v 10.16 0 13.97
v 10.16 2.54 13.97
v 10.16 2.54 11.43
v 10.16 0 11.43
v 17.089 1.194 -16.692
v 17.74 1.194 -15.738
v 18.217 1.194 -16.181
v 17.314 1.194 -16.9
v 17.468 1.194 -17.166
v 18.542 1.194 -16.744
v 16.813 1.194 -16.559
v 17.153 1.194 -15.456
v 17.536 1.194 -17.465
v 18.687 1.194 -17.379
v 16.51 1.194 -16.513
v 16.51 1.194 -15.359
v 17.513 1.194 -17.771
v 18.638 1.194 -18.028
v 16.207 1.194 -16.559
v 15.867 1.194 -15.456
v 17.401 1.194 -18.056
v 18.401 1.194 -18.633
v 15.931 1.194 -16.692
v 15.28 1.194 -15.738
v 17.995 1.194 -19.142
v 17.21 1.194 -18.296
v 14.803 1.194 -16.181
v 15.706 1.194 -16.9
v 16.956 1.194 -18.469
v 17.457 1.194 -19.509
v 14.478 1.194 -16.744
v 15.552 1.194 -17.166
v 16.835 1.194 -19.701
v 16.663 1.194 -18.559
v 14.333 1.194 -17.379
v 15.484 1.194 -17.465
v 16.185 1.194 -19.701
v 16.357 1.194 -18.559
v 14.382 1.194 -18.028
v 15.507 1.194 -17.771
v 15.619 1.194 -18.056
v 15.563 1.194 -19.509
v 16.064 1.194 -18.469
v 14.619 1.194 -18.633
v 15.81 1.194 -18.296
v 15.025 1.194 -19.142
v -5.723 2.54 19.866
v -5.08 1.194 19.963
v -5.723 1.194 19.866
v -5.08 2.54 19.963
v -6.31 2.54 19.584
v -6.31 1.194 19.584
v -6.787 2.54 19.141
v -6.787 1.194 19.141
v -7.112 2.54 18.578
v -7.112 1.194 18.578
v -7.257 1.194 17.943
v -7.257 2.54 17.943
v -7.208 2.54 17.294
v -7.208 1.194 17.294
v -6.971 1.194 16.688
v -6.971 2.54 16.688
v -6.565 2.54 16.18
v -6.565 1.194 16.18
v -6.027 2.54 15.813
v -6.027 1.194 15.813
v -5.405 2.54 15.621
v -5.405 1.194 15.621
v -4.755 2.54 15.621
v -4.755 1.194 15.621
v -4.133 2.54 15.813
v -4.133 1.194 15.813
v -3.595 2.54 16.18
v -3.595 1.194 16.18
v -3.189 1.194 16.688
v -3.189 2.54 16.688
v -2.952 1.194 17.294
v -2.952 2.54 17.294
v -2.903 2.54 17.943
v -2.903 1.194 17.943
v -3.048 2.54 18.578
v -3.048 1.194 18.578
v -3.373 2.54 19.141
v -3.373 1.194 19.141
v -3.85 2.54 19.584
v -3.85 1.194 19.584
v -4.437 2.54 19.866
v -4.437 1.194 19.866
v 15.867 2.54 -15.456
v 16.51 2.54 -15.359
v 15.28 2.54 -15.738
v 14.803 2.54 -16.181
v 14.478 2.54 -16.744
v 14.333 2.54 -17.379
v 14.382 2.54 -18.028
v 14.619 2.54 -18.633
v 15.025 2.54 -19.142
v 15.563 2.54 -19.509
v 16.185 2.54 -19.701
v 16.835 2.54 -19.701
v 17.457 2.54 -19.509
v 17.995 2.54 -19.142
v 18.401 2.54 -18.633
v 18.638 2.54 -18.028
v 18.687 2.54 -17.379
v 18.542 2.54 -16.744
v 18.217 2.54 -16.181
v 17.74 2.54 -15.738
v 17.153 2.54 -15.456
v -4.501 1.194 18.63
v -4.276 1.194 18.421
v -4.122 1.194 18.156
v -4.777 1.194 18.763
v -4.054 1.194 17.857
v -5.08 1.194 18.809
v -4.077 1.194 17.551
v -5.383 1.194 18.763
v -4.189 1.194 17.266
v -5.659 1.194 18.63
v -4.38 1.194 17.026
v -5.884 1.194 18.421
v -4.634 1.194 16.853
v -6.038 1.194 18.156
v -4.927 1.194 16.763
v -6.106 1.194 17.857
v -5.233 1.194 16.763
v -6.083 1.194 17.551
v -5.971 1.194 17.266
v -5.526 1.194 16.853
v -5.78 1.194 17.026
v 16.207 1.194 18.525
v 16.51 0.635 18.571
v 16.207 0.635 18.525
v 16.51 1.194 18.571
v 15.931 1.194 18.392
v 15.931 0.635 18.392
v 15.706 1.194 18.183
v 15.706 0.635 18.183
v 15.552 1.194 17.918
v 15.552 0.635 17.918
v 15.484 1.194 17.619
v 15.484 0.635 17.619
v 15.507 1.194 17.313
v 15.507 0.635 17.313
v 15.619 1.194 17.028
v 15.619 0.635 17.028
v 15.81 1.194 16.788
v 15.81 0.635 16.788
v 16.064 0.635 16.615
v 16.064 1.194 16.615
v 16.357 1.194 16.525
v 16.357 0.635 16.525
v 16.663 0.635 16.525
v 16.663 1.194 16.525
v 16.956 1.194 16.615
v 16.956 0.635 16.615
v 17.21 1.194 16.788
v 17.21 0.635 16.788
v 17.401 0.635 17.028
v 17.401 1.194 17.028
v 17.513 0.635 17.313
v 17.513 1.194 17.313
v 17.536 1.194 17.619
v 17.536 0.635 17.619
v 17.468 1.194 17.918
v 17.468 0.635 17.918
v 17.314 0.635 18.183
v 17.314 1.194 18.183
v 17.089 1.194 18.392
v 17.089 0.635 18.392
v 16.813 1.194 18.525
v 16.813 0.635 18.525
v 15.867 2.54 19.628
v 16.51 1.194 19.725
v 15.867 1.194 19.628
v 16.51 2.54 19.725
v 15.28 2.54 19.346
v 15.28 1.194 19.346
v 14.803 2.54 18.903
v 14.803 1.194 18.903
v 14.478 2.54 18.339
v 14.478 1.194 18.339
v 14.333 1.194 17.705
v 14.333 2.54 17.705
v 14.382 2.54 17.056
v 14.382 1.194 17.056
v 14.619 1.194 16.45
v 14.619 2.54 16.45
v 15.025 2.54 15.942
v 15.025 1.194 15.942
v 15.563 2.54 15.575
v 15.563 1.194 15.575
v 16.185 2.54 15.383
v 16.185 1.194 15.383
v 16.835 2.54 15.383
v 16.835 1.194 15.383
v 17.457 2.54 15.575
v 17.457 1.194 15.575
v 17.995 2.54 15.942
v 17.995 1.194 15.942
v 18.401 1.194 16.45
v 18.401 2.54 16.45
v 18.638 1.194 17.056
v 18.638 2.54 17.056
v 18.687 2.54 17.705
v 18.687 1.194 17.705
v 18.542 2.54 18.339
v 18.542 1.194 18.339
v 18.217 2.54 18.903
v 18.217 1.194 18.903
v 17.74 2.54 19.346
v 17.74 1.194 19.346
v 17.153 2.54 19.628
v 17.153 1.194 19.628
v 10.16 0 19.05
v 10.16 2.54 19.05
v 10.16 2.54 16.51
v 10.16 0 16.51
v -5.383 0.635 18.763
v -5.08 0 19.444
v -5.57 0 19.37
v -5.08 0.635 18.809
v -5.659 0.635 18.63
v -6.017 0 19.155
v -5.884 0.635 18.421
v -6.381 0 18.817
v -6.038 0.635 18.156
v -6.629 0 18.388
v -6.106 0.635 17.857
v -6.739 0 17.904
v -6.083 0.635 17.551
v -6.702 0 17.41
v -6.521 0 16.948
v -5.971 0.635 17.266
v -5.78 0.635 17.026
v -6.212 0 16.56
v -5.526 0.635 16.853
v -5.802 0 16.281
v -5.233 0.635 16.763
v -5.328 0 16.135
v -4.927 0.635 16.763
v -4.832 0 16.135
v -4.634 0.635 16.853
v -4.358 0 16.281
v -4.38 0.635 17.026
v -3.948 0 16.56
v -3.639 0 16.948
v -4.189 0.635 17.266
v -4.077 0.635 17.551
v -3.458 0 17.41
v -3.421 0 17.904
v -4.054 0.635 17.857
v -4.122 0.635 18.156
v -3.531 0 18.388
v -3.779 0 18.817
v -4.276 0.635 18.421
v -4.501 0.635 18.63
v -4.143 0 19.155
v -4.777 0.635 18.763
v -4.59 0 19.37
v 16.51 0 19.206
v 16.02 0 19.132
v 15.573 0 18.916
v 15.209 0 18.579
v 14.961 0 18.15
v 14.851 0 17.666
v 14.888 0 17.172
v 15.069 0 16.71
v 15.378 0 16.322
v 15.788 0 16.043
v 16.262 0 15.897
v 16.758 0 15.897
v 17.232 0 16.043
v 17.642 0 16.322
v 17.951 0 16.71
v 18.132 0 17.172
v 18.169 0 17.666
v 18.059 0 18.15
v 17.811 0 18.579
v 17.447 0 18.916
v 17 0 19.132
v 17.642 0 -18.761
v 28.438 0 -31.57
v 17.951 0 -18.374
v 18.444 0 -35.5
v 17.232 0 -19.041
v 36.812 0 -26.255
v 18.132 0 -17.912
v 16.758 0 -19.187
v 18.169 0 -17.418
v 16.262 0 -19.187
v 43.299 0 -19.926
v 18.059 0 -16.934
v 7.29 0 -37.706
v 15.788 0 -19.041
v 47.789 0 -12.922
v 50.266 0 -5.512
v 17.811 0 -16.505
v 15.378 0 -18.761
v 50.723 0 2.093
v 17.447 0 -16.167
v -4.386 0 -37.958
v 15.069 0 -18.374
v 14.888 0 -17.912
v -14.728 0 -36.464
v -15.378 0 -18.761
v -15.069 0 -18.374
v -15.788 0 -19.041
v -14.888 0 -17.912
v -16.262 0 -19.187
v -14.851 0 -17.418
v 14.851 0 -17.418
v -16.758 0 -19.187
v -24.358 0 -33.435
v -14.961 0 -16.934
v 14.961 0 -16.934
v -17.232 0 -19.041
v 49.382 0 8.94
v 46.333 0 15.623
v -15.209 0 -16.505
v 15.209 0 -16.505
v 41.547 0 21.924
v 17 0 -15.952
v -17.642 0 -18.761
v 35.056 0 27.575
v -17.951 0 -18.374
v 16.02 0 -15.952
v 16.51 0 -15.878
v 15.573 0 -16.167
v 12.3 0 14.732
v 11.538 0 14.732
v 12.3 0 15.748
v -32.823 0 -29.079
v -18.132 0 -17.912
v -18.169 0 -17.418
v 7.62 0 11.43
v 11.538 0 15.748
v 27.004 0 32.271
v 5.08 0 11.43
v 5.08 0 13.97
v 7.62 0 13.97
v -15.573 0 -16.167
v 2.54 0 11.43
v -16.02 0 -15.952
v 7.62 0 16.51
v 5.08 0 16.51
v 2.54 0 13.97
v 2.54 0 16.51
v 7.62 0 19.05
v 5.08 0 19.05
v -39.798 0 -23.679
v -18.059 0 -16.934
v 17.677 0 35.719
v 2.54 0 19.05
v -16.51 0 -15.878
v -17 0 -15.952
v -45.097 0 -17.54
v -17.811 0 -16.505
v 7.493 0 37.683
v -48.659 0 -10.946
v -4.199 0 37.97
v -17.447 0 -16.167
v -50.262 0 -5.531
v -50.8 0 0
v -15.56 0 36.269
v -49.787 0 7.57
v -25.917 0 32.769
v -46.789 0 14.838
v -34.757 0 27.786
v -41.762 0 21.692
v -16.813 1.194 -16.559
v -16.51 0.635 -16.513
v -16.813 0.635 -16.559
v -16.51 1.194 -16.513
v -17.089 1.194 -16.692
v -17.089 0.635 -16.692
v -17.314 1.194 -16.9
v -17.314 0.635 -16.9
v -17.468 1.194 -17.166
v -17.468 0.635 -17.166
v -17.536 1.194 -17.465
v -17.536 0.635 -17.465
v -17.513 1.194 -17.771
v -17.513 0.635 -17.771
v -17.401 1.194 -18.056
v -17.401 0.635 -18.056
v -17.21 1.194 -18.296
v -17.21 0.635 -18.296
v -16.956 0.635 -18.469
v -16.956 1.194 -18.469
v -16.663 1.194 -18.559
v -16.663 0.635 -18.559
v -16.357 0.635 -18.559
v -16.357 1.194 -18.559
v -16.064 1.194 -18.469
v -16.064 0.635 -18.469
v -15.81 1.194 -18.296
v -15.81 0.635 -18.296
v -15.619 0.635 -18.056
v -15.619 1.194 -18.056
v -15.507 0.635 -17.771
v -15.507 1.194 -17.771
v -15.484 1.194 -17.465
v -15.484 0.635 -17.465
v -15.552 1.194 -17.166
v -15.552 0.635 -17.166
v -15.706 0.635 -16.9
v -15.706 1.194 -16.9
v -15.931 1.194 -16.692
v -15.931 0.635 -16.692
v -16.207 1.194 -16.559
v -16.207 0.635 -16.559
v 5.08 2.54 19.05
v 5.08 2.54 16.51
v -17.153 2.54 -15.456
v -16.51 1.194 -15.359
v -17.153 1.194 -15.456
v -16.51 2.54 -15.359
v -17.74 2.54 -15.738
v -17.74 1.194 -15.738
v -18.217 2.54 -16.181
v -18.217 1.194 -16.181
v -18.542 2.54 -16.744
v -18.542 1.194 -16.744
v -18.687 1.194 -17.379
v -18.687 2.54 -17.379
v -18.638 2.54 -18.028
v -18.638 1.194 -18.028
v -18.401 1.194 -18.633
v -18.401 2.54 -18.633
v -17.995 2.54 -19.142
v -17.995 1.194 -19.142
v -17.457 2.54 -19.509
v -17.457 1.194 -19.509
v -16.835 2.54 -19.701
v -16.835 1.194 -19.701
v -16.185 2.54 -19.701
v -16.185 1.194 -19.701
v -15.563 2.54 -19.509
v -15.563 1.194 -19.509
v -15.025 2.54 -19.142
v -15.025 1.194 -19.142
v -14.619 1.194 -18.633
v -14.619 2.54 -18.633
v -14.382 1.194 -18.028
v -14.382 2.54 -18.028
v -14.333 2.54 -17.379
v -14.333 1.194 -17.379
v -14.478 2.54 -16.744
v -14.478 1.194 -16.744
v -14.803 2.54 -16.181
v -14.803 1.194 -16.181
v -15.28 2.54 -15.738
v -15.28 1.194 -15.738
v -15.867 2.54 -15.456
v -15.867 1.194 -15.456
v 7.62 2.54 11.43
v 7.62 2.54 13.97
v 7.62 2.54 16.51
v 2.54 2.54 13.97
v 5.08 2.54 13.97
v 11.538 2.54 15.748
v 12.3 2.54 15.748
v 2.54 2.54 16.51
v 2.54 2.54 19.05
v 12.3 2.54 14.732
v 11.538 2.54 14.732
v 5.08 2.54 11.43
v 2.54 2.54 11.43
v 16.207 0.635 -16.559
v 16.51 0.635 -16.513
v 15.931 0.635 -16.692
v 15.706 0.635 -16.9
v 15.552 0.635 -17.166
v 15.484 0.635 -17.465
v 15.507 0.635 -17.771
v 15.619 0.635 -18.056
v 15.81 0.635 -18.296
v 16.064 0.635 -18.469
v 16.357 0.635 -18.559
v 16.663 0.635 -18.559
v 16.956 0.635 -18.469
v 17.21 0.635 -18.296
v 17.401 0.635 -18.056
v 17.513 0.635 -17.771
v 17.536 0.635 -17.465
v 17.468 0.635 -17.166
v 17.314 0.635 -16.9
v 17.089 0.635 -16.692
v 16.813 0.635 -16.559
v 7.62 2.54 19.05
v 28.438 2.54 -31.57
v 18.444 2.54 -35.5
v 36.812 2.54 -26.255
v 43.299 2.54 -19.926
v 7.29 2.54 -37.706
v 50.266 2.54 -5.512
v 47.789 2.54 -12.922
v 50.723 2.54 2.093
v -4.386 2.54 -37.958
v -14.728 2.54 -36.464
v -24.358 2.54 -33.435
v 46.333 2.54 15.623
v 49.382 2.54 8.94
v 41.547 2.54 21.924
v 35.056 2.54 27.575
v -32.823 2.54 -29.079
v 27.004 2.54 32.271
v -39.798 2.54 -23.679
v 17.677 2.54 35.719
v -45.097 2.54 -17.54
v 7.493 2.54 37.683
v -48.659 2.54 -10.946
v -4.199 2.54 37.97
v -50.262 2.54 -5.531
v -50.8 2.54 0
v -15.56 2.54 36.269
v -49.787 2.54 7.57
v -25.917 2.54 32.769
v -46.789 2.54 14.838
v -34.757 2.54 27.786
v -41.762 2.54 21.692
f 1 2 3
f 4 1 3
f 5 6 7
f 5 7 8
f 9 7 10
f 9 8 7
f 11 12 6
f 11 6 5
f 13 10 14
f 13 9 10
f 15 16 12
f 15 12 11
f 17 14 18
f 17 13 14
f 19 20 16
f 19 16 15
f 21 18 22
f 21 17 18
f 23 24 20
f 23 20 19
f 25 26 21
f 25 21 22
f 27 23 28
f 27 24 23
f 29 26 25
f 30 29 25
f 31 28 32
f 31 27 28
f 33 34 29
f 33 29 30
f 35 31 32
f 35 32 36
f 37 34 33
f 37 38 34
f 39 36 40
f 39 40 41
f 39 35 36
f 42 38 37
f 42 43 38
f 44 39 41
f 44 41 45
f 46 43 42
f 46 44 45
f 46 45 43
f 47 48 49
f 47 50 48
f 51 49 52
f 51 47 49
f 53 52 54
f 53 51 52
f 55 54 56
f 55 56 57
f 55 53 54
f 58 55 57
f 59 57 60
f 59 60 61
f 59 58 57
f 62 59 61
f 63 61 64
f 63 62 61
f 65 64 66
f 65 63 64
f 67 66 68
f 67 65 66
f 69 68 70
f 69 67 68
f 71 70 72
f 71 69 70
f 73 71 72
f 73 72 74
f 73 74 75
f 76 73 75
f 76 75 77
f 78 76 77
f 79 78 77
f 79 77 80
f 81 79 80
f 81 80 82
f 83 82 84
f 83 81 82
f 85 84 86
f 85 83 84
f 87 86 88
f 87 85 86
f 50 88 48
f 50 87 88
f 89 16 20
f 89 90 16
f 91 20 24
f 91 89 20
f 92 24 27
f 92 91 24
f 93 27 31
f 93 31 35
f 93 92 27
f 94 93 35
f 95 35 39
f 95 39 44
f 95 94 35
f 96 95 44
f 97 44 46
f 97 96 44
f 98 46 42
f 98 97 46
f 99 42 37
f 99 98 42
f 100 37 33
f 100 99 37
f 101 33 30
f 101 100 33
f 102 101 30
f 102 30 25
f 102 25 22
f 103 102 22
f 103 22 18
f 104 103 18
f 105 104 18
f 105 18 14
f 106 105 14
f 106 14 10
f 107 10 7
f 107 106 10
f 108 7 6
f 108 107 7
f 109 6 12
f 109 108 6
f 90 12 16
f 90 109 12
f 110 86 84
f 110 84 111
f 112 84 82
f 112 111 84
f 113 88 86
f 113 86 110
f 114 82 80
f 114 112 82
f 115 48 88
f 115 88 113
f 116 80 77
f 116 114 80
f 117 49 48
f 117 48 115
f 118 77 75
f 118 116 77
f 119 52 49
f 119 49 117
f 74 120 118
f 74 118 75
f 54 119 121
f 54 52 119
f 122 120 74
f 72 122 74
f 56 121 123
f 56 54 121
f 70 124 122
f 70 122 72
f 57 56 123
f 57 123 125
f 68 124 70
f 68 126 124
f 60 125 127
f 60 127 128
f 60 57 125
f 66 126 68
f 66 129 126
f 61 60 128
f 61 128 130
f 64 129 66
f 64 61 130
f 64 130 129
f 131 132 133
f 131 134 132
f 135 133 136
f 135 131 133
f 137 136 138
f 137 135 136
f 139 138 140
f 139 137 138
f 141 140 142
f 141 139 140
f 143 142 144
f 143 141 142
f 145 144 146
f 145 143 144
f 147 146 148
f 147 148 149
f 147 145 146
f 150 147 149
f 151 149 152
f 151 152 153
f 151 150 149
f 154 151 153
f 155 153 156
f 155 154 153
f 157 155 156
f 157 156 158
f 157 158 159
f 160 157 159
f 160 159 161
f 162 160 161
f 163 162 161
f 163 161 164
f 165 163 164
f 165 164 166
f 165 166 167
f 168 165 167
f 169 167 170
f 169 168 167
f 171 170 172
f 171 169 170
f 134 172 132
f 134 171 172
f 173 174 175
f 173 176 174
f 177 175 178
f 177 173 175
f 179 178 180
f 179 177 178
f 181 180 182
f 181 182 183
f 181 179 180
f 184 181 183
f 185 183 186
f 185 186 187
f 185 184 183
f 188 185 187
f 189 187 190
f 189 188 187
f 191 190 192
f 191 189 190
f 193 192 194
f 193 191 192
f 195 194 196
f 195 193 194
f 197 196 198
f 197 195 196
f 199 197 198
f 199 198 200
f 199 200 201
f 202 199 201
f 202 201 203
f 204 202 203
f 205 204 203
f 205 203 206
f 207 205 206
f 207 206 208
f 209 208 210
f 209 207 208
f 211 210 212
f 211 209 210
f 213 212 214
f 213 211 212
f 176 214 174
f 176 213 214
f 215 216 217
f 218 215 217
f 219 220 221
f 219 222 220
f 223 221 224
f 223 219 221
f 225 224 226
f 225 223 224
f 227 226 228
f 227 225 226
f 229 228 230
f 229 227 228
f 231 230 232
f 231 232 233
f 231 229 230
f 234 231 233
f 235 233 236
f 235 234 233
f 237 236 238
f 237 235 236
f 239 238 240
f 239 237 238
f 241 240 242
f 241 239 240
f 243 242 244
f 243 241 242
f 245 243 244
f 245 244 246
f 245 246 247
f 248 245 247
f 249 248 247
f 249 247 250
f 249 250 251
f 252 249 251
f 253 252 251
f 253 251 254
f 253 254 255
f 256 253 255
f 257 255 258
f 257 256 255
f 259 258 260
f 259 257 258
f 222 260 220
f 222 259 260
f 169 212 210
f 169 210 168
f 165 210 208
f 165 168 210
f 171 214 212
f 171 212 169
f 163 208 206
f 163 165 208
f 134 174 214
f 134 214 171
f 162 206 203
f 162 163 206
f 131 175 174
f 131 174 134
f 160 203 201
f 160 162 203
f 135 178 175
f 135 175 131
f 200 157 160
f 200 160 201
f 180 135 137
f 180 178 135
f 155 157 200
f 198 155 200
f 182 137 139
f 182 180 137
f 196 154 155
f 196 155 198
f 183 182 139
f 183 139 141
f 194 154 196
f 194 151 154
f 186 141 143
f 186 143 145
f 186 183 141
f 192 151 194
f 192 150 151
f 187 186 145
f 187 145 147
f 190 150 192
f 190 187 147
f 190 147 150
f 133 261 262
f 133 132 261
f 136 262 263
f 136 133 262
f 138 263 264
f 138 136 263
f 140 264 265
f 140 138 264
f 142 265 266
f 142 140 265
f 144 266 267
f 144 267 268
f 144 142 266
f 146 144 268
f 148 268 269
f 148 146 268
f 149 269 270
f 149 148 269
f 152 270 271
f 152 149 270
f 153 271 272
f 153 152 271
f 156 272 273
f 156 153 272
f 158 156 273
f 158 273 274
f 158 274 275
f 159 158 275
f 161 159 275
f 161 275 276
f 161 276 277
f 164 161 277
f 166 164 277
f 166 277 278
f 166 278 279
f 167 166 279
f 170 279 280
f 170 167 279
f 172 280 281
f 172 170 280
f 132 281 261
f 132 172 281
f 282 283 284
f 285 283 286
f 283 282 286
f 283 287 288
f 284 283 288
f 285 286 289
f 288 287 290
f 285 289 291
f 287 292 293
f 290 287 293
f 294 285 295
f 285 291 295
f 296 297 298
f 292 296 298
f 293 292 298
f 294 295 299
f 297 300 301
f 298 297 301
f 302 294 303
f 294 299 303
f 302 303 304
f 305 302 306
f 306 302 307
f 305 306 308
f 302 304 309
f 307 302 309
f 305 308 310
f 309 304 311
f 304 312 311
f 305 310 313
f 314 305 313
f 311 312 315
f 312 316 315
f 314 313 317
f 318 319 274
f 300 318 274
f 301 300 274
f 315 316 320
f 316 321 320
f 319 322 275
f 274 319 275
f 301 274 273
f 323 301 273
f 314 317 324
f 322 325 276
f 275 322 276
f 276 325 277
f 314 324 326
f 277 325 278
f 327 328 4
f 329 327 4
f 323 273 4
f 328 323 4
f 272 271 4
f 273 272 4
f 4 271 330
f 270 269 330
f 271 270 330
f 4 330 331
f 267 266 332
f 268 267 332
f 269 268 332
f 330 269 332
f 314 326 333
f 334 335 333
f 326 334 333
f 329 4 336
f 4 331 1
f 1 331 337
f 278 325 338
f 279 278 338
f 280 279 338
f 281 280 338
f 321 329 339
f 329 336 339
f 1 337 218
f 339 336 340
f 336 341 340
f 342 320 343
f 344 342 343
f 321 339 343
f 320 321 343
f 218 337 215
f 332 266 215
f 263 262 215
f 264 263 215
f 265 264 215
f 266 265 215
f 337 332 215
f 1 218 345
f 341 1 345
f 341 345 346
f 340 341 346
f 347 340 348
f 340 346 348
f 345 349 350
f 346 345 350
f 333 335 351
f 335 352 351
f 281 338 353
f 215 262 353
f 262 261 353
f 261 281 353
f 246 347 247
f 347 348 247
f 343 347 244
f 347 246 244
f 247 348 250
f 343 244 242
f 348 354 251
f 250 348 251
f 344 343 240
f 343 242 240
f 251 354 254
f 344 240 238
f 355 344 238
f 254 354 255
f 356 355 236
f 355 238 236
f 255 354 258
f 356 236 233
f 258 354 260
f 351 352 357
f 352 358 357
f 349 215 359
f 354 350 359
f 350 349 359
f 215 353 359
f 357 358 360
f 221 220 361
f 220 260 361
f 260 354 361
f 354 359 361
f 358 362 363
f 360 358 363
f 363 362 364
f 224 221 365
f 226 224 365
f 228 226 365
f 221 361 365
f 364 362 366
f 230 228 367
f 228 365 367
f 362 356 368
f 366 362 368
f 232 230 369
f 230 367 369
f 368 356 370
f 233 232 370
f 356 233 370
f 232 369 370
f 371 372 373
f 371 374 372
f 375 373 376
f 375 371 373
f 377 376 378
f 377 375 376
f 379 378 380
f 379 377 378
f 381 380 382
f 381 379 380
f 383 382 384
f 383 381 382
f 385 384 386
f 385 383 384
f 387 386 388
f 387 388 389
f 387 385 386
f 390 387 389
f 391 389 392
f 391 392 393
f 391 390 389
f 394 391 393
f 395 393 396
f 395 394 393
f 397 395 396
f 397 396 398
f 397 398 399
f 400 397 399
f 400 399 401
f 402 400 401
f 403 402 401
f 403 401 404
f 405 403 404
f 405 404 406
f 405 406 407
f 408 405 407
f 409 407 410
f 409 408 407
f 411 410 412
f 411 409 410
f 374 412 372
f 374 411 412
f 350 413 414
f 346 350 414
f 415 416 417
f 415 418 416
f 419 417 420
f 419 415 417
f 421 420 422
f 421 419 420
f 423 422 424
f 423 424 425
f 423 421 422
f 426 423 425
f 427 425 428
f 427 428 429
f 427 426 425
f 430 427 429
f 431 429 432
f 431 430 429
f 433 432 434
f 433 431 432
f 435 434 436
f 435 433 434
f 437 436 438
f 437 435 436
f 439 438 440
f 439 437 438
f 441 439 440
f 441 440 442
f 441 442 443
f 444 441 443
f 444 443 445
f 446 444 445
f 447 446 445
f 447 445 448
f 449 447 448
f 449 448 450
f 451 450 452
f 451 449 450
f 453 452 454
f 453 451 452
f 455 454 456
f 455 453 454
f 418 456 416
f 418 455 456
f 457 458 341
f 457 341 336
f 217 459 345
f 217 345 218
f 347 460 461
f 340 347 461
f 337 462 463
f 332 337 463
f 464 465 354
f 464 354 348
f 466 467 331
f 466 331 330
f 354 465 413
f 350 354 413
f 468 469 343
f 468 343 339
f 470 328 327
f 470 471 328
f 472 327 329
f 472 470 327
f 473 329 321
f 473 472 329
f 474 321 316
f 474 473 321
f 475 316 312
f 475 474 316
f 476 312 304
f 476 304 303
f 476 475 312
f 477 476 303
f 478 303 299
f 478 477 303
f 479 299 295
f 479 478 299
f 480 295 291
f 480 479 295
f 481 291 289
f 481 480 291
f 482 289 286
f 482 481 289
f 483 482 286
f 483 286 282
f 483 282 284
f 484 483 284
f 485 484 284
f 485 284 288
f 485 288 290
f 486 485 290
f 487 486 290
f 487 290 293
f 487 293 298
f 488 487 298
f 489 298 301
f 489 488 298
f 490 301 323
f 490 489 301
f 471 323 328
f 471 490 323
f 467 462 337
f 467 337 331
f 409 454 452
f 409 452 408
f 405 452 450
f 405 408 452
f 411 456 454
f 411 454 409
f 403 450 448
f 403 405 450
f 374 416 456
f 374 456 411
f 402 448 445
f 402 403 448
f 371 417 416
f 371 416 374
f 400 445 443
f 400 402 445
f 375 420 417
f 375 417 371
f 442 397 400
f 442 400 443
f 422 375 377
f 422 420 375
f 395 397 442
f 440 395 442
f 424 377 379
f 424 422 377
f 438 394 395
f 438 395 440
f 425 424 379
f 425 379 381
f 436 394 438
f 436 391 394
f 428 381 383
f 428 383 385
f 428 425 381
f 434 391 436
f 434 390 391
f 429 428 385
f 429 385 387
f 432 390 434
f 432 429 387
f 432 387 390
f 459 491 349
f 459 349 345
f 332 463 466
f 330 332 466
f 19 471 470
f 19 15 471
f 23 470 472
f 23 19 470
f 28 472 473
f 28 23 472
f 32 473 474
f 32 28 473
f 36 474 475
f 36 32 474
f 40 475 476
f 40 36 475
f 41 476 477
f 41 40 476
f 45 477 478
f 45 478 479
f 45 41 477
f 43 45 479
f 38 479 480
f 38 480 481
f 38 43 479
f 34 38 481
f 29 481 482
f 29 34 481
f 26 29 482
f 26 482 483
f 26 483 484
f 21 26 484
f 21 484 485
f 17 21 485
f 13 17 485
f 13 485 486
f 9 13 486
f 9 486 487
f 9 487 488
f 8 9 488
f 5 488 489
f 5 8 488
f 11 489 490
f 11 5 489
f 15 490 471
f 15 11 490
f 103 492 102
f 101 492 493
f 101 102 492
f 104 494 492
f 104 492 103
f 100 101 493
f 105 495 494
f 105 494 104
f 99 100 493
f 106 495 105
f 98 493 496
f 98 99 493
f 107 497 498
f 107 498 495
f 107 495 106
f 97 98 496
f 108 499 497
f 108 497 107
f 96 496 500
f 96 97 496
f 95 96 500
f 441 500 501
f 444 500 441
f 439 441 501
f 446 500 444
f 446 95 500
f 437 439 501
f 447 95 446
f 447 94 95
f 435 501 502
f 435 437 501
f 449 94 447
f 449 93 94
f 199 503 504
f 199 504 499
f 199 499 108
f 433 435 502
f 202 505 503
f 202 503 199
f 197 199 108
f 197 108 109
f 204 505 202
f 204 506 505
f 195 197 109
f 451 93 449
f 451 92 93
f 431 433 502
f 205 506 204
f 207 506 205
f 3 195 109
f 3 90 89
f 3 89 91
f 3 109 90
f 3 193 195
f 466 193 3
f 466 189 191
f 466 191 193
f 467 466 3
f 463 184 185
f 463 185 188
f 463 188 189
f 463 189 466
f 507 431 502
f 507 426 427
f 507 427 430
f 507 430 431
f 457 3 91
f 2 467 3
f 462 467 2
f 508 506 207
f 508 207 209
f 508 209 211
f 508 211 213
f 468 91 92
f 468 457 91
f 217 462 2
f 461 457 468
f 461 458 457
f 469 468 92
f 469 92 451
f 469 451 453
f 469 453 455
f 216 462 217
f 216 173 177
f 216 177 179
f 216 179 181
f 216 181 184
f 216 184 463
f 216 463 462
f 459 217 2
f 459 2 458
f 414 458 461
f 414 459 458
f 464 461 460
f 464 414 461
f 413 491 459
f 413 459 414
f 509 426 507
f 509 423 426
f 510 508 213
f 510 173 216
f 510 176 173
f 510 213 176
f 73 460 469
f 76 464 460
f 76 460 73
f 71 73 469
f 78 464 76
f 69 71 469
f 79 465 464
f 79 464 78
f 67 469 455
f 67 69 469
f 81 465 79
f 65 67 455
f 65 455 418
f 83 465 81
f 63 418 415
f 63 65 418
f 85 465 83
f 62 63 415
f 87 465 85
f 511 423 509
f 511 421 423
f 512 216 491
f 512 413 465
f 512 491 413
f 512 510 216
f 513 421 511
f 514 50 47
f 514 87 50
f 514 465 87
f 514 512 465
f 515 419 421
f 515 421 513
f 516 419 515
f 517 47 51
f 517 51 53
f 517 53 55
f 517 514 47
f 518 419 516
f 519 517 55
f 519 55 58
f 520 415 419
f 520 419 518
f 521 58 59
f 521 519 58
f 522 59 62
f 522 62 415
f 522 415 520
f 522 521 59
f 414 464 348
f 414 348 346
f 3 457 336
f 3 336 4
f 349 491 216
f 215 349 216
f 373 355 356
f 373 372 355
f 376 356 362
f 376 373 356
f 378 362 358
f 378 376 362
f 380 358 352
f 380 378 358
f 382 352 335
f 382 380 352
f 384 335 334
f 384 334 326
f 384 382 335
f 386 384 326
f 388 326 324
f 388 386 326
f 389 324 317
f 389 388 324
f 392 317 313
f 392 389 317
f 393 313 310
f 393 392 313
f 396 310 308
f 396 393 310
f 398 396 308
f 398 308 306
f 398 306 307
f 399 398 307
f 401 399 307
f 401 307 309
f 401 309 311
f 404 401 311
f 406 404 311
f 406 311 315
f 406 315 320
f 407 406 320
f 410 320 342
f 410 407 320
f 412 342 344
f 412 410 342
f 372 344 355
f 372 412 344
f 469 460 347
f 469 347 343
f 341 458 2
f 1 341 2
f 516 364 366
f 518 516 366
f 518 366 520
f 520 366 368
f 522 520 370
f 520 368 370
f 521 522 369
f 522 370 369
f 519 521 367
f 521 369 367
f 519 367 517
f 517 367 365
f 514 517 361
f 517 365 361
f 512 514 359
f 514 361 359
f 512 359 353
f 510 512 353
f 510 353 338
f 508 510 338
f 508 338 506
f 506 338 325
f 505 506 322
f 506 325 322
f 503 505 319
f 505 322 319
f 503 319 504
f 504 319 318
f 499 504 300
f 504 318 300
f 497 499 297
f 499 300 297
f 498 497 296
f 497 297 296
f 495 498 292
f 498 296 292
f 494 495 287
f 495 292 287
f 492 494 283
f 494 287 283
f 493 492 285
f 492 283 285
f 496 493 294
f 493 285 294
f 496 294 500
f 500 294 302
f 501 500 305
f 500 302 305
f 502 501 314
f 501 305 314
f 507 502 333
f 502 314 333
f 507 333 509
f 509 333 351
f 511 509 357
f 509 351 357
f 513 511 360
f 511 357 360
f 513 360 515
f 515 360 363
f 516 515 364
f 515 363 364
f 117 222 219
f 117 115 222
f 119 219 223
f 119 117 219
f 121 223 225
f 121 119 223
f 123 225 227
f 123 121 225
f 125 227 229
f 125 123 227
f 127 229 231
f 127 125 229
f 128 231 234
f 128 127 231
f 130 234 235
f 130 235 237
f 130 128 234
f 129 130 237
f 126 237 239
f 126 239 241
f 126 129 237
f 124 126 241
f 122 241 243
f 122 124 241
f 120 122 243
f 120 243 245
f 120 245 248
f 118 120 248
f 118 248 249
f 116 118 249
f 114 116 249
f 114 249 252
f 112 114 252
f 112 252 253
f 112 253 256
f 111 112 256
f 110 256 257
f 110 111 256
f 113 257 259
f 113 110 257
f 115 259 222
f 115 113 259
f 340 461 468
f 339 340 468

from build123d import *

# Parameters (mm, degrees)
SKETCH2_RX                                   = 50.8
SKETCH2_RY                                   = 38.1
TOP_DEPTH                                    = 2.54
SKETCH4_W                                    = 2.54
SKETCH4_H                                    = 2.54
SKETCH4_W_2                                  = 0.762
SKETCH4_H_2                                  = 1.016
BUTTONS_AND_LED_DEPTH                        = 2.54
CBORE_FOR_1_PAN_HEAD_MACHINE_SCREW1_AT_COUNT = 2
CBORE_FOR_1_PAN_HEAD_MACHINE_SCREW1_AT_PITCH = 21.591313149
CBORE_FOR_1_PAN_HEAD_MACHINE_SCREW1_2_COUNT  = 2
CBORE_FOR_1_PAN_HEAD_MACHINE_SCREW1_2_PITCH  = 41.397620143
CBORE_FOR_1_PAN_HEAD_MACHINE_SCREW1_3_COUNT  = 2
CBORE_FOR_1_PAN_HEAD_MACHINE_SCREW1_3_PITCH  = 37.125190283


with BuildPart() as part:
    # Sketch2 → top (new body)
    with BuildSketch(Plane(origin=(0, 0, 0), x_dir=(1, 0, 0), z_dir=(0, 1, 0))):
        with Locations(Location((0, 0), (0, 0, 180))):
            Ellipse(SKETCH2_RX, SKETCH2_RY)
    extrude(amount=TOP_DEPTH)

    # Sketch4 → buttons and LED (cut)
    with BuildSketch(Plane(origin=(0, 2.54, 0), x_dir=(1, 0, 0), z_dir=(0, 1, 0))):
        with Locations((8.89, -17.78)):
            Rectangle(SKETCH4_W, SKETCH4_H)
        with Locations((8.89, -12.7)):
            Rectangle(SKETCH4_W, SKETCH4_H)
        with Locations((3.81, -17.78)):
            Rectangle(SKETCH4_W, SKETCH4_H)
        with Locations((3.81, -12.7)):
            Rectangle(SKETCH4_W, SKETCH4_H)
        with Locations((11.918930211, -15.24)):
            Rectangle(SKETCH4_W_2, SKETCH4_H_2)
    extrude(amount=-BUTTONS_AND_LED_DEPTH, mode=Mode.SUBTRACT)

    # Sketch5 → CBORE for #1 Pan Head Machine Screw1 (revolve, cut)
    with BuildSketch(Plane(origin=(-5.08, 2.54, 17.78), x_dir=(0, 0, 1), z_dir=(1, 0, 0))):
        Polygon((0, 0), (0, 2.54), (1.6637, 2.54), (1.0287, 1.905), (1.0287, 1.3462), (2.18313, 1.3462), (2.18313, 0), align=None)
    cbore_for_1_pan_head_machine_screw1 = revolve(axis=Axis((-5.08, 8.89, 17.78), (0, -1, 0)), mode=Mode.SUBTRACT)

    # CBORE for #1 Pan Head Machine Screw1 at: CBORE for #1 Pan Head Machine Screw1 ×2
    with Locations(*[Vector(0.9999391815868314, 0, -0.011028740973384169) * (i * CBORE_FOR_1_PAN_HEAD_MACHINE_SCREW1_AT_PITCH) for i in range(1, CBORE_FOR_1_PAN_HEAD_MACHINE_SCREW1_AT_COUNT)]):
        add(cbore_for_1_pan_head_machine_screw1, mode=Mode.SUBTRACT)

    # CBORE for _1 Pan Head Machine Screw1 2: CBORE for #1 Pan Head Machine Screw1 ×2
    with Locations(*[Vector(0.5215275642742045, 0, -0.8532344341986062) * (i * CBORE_FOR_1_PAN_HEAD_MACHINE_SCREW1_2_PITCH) for i in range(1, CBORE_FOR_1_PAN_HEAD_MACHINE_SCREW1_2_COUNT)]):
        add(cbore_for_1_pan_head_machine_screw1, mode=Mode.SUBTRACT)

    # CBORE for _1 Pan Head Machine Screw1 3: CBORE for #1 Pan Head Machine Screw1 ×2
    with Locations(*[Vector(-0.3078772098677194, 0, -0.9514260999384389) * (i * CBORE_FOR_1_PAN_HEAD_MACHINE_SCREW1_3_PITCH) for i in range(1, CBORE_FOR_1_PAN_HEAD_MACHINE_SCREW1_3_COUNT)]):
        add(cbore_for_1_pan_head_machine_screw1, mode=Mode.SUBTRACT)


solid = part.part
